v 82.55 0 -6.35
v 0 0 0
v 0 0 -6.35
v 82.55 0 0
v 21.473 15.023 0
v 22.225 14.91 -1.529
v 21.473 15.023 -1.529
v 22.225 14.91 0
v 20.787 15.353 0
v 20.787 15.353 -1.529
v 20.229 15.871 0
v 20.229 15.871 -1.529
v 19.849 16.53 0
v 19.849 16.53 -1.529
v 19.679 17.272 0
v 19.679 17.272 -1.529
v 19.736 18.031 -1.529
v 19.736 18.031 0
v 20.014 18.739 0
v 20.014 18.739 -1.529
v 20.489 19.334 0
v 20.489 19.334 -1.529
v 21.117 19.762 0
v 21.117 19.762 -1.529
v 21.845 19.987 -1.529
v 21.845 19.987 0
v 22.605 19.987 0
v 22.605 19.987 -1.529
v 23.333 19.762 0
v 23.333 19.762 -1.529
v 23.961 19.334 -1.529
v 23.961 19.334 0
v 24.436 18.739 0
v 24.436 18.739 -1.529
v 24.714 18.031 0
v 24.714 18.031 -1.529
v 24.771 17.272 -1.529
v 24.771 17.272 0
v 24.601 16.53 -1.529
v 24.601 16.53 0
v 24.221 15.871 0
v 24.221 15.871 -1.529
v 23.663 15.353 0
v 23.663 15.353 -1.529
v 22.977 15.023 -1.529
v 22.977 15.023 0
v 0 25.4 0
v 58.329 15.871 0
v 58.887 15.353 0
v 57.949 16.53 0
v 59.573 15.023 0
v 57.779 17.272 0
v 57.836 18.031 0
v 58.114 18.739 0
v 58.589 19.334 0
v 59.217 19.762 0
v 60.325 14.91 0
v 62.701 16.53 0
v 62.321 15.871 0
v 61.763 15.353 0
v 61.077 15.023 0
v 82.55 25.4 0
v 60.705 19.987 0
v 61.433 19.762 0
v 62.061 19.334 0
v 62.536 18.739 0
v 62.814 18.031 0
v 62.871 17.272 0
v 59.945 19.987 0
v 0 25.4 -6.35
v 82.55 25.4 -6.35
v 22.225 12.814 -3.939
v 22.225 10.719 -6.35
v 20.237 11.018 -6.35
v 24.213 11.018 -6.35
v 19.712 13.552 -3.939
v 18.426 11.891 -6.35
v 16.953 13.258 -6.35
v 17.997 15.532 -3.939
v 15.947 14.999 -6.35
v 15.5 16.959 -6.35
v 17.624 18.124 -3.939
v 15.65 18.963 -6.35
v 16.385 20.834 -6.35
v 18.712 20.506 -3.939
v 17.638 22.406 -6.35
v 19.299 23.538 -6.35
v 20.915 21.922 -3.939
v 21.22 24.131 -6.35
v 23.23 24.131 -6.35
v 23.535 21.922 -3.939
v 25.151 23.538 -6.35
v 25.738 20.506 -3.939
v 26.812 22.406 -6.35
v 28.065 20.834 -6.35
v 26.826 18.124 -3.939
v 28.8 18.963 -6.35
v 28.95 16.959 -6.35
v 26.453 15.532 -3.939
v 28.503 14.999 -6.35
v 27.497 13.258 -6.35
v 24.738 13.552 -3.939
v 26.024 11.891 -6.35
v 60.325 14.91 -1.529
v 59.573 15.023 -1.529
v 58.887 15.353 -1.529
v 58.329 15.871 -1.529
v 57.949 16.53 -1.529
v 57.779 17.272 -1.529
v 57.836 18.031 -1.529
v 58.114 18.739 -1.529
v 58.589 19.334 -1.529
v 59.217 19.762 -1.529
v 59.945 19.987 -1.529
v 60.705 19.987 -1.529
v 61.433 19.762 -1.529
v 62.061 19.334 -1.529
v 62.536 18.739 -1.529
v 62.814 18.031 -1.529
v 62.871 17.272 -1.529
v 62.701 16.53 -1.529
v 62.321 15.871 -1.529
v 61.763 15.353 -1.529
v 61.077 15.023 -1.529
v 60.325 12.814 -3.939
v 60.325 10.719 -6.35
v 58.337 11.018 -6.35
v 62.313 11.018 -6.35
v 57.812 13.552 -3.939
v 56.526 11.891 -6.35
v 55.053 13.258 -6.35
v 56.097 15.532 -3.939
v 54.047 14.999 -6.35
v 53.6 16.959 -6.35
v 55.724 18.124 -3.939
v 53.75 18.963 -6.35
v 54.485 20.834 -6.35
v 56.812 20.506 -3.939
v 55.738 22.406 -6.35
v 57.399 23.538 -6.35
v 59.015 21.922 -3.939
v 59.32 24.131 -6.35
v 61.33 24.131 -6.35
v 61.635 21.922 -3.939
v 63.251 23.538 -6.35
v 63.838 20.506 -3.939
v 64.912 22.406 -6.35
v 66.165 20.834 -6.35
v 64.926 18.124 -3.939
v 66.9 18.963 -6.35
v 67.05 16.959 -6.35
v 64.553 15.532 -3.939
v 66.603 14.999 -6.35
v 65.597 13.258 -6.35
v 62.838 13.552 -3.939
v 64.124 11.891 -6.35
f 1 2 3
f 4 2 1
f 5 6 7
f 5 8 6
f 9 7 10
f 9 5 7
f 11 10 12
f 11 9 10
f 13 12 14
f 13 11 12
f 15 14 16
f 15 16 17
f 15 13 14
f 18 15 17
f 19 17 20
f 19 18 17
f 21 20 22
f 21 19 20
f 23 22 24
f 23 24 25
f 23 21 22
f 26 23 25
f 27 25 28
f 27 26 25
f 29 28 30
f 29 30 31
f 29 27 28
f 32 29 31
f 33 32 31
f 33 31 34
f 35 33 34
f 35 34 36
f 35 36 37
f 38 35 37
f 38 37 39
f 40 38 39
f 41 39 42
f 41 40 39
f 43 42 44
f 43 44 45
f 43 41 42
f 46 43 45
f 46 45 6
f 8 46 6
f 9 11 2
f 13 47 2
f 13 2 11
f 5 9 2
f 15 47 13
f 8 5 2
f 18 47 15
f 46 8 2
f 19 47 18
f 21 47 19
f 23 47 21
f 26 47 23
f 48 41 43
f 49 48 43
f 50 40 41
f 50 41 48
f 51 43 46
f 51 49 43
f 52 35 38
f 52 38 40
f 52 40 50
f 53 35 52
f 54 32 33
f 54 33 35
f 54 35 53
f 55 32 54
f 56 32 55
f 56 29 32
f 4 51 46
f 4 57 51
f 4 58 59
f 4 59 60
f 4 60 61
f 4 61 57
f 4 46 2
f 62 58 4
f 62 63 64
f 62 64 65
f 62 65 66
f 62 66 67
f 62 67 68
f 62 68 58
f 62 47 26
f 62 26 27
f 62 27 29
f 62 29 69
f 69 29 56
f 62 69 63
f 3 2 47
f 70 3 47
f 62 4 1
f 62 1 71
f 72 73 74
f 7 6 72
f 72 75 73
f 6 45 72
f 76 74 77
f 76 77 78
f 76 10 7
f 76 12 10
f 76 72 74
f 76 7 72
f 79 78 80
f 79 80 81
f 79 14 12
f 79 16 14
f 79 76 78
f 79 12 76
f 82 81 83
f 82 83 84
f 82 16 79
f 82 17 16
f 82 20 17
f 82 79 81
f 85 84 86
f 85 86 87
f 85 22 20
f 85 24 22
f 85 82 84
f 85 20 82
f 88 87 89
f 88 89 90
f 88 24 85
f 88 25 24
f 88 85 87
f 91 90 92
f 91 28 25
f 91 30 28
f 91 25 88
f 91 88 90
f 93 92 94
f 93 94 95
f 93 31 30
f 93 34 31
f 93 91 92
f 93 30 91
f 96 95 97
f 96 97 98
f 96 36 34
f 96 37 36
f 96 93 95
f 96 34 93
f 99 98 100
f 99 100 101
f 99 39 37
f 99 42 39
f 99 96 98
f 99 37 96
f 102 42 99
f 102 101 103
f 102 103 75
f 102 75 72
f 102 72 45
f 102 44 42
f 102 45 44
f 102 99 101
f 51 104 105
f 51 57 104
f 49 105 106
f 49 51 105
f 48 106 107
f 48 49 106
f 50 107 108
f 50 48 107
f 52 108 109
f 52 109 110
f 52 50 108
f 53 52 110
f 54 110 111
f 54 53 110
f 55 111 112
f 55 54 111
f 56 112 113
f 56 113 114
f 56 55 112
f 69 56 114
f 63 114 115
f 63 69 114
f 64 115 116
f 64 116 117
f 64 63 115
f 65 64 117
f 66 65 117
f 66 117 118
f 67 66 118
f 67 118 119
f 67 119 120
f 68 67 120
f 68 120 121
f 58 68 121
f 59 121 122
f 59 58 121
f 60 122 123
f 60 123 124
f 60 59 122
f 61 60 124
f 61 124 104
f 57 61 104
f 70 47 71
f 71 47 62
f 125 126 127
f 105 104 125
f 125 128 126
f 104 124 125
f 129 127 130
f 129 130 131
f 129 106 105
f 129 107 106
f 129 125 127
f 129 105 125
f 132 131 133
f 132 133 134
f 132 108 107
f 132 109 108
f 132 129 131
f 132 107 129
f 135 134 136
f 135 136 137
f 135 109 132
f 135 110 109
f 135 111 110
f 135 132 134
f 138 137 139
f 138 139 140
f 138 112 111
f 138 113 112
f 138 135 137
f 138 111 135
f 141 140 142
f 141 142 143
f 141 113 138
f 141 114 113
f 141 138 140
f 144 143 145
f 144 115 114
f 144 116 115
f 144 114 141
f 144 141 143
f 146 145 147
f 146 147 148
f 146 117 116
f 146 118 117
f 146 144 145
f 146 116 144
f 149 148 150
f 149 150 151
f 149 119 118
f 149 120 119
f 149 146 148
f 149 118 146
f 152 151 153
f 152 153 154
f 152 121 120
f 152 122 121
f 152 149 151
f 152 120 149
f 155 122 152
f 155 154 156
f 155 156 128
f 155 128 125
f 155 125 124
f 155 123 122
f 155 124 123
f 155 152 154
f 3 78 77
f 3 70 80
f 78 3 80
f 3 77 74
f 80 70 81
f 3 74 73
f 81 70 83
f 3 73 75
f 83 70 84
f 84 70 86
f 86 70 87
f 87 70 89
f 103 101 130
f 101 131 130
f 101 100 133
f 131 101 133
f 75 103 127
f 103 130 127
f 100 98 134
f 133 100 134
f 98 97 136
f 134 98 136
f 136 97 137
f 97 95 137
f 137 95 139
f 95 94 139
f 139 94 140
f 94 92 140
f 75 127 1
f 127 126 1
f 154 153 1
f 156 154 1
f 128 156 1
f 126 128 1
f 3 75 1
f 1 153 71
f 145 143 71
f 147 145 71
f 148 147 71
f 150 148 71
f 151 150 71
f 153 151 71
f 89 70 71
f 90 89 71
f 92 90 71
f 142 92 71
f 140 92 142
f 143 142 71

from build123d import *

# Parameters (mm, degrees)
SKETCH1_W                        = 82.55
SKETCH1_H                        = 25.4
BOSS_EXTRUDE1_DEPTH              = 6.35
F_1_4_20_TAPPED_HOLE1_AT_2_COUNT = 2
F_1_4_20_TAPPED_HOLE1_AT_2_PITCH = 38.1


with BuildPart() as part:
    # Sketch1 → Boss-Extrude1 (new body)
    with BuildSketch(Plane.XY):
        with Locations((41.275, 12.7)):
            Rectangle(SKETCH1_W, SKETCH1_H)
    extrude(amount=-BOSS_EXTRUDE1_DEPTH)

    # Sketch3 → 1/4-20 Tapped Hole1 (revolve, cut)
    with BuildSketch(Plane(origin=(22.225, 17.4625, 0), x_dir=(0, -1, 0), z_dir=(1, 0, 0))):
        Polygon((0, 0), (0, 6.35), (6.7437, 6.35), (2.5527, 1.528806005), (2.5527, 0), align=None)
    f_1_4_20_tapped_hole1 = revolve(axis=Axis((22.225, 17.4625, 6.35), (0, 0, -1)), mode=Mode.SUBTRACT)

    # 1/4-20 Tapped Hole1 at 2: 1/4-20 Tapped Hole1 ×2
    with Locations(*[(i * F_1_4_20_TAPPED_HOLE1_AT_2_PITCH, 0, 0) for i in range(1, F_1_4_20_TAPPED_HOLE1_AT_2_COUNT)]):
        add(f_1_4_20_tapped_hole1, mode=Mode.SUBTRACT)


solid = part.part
